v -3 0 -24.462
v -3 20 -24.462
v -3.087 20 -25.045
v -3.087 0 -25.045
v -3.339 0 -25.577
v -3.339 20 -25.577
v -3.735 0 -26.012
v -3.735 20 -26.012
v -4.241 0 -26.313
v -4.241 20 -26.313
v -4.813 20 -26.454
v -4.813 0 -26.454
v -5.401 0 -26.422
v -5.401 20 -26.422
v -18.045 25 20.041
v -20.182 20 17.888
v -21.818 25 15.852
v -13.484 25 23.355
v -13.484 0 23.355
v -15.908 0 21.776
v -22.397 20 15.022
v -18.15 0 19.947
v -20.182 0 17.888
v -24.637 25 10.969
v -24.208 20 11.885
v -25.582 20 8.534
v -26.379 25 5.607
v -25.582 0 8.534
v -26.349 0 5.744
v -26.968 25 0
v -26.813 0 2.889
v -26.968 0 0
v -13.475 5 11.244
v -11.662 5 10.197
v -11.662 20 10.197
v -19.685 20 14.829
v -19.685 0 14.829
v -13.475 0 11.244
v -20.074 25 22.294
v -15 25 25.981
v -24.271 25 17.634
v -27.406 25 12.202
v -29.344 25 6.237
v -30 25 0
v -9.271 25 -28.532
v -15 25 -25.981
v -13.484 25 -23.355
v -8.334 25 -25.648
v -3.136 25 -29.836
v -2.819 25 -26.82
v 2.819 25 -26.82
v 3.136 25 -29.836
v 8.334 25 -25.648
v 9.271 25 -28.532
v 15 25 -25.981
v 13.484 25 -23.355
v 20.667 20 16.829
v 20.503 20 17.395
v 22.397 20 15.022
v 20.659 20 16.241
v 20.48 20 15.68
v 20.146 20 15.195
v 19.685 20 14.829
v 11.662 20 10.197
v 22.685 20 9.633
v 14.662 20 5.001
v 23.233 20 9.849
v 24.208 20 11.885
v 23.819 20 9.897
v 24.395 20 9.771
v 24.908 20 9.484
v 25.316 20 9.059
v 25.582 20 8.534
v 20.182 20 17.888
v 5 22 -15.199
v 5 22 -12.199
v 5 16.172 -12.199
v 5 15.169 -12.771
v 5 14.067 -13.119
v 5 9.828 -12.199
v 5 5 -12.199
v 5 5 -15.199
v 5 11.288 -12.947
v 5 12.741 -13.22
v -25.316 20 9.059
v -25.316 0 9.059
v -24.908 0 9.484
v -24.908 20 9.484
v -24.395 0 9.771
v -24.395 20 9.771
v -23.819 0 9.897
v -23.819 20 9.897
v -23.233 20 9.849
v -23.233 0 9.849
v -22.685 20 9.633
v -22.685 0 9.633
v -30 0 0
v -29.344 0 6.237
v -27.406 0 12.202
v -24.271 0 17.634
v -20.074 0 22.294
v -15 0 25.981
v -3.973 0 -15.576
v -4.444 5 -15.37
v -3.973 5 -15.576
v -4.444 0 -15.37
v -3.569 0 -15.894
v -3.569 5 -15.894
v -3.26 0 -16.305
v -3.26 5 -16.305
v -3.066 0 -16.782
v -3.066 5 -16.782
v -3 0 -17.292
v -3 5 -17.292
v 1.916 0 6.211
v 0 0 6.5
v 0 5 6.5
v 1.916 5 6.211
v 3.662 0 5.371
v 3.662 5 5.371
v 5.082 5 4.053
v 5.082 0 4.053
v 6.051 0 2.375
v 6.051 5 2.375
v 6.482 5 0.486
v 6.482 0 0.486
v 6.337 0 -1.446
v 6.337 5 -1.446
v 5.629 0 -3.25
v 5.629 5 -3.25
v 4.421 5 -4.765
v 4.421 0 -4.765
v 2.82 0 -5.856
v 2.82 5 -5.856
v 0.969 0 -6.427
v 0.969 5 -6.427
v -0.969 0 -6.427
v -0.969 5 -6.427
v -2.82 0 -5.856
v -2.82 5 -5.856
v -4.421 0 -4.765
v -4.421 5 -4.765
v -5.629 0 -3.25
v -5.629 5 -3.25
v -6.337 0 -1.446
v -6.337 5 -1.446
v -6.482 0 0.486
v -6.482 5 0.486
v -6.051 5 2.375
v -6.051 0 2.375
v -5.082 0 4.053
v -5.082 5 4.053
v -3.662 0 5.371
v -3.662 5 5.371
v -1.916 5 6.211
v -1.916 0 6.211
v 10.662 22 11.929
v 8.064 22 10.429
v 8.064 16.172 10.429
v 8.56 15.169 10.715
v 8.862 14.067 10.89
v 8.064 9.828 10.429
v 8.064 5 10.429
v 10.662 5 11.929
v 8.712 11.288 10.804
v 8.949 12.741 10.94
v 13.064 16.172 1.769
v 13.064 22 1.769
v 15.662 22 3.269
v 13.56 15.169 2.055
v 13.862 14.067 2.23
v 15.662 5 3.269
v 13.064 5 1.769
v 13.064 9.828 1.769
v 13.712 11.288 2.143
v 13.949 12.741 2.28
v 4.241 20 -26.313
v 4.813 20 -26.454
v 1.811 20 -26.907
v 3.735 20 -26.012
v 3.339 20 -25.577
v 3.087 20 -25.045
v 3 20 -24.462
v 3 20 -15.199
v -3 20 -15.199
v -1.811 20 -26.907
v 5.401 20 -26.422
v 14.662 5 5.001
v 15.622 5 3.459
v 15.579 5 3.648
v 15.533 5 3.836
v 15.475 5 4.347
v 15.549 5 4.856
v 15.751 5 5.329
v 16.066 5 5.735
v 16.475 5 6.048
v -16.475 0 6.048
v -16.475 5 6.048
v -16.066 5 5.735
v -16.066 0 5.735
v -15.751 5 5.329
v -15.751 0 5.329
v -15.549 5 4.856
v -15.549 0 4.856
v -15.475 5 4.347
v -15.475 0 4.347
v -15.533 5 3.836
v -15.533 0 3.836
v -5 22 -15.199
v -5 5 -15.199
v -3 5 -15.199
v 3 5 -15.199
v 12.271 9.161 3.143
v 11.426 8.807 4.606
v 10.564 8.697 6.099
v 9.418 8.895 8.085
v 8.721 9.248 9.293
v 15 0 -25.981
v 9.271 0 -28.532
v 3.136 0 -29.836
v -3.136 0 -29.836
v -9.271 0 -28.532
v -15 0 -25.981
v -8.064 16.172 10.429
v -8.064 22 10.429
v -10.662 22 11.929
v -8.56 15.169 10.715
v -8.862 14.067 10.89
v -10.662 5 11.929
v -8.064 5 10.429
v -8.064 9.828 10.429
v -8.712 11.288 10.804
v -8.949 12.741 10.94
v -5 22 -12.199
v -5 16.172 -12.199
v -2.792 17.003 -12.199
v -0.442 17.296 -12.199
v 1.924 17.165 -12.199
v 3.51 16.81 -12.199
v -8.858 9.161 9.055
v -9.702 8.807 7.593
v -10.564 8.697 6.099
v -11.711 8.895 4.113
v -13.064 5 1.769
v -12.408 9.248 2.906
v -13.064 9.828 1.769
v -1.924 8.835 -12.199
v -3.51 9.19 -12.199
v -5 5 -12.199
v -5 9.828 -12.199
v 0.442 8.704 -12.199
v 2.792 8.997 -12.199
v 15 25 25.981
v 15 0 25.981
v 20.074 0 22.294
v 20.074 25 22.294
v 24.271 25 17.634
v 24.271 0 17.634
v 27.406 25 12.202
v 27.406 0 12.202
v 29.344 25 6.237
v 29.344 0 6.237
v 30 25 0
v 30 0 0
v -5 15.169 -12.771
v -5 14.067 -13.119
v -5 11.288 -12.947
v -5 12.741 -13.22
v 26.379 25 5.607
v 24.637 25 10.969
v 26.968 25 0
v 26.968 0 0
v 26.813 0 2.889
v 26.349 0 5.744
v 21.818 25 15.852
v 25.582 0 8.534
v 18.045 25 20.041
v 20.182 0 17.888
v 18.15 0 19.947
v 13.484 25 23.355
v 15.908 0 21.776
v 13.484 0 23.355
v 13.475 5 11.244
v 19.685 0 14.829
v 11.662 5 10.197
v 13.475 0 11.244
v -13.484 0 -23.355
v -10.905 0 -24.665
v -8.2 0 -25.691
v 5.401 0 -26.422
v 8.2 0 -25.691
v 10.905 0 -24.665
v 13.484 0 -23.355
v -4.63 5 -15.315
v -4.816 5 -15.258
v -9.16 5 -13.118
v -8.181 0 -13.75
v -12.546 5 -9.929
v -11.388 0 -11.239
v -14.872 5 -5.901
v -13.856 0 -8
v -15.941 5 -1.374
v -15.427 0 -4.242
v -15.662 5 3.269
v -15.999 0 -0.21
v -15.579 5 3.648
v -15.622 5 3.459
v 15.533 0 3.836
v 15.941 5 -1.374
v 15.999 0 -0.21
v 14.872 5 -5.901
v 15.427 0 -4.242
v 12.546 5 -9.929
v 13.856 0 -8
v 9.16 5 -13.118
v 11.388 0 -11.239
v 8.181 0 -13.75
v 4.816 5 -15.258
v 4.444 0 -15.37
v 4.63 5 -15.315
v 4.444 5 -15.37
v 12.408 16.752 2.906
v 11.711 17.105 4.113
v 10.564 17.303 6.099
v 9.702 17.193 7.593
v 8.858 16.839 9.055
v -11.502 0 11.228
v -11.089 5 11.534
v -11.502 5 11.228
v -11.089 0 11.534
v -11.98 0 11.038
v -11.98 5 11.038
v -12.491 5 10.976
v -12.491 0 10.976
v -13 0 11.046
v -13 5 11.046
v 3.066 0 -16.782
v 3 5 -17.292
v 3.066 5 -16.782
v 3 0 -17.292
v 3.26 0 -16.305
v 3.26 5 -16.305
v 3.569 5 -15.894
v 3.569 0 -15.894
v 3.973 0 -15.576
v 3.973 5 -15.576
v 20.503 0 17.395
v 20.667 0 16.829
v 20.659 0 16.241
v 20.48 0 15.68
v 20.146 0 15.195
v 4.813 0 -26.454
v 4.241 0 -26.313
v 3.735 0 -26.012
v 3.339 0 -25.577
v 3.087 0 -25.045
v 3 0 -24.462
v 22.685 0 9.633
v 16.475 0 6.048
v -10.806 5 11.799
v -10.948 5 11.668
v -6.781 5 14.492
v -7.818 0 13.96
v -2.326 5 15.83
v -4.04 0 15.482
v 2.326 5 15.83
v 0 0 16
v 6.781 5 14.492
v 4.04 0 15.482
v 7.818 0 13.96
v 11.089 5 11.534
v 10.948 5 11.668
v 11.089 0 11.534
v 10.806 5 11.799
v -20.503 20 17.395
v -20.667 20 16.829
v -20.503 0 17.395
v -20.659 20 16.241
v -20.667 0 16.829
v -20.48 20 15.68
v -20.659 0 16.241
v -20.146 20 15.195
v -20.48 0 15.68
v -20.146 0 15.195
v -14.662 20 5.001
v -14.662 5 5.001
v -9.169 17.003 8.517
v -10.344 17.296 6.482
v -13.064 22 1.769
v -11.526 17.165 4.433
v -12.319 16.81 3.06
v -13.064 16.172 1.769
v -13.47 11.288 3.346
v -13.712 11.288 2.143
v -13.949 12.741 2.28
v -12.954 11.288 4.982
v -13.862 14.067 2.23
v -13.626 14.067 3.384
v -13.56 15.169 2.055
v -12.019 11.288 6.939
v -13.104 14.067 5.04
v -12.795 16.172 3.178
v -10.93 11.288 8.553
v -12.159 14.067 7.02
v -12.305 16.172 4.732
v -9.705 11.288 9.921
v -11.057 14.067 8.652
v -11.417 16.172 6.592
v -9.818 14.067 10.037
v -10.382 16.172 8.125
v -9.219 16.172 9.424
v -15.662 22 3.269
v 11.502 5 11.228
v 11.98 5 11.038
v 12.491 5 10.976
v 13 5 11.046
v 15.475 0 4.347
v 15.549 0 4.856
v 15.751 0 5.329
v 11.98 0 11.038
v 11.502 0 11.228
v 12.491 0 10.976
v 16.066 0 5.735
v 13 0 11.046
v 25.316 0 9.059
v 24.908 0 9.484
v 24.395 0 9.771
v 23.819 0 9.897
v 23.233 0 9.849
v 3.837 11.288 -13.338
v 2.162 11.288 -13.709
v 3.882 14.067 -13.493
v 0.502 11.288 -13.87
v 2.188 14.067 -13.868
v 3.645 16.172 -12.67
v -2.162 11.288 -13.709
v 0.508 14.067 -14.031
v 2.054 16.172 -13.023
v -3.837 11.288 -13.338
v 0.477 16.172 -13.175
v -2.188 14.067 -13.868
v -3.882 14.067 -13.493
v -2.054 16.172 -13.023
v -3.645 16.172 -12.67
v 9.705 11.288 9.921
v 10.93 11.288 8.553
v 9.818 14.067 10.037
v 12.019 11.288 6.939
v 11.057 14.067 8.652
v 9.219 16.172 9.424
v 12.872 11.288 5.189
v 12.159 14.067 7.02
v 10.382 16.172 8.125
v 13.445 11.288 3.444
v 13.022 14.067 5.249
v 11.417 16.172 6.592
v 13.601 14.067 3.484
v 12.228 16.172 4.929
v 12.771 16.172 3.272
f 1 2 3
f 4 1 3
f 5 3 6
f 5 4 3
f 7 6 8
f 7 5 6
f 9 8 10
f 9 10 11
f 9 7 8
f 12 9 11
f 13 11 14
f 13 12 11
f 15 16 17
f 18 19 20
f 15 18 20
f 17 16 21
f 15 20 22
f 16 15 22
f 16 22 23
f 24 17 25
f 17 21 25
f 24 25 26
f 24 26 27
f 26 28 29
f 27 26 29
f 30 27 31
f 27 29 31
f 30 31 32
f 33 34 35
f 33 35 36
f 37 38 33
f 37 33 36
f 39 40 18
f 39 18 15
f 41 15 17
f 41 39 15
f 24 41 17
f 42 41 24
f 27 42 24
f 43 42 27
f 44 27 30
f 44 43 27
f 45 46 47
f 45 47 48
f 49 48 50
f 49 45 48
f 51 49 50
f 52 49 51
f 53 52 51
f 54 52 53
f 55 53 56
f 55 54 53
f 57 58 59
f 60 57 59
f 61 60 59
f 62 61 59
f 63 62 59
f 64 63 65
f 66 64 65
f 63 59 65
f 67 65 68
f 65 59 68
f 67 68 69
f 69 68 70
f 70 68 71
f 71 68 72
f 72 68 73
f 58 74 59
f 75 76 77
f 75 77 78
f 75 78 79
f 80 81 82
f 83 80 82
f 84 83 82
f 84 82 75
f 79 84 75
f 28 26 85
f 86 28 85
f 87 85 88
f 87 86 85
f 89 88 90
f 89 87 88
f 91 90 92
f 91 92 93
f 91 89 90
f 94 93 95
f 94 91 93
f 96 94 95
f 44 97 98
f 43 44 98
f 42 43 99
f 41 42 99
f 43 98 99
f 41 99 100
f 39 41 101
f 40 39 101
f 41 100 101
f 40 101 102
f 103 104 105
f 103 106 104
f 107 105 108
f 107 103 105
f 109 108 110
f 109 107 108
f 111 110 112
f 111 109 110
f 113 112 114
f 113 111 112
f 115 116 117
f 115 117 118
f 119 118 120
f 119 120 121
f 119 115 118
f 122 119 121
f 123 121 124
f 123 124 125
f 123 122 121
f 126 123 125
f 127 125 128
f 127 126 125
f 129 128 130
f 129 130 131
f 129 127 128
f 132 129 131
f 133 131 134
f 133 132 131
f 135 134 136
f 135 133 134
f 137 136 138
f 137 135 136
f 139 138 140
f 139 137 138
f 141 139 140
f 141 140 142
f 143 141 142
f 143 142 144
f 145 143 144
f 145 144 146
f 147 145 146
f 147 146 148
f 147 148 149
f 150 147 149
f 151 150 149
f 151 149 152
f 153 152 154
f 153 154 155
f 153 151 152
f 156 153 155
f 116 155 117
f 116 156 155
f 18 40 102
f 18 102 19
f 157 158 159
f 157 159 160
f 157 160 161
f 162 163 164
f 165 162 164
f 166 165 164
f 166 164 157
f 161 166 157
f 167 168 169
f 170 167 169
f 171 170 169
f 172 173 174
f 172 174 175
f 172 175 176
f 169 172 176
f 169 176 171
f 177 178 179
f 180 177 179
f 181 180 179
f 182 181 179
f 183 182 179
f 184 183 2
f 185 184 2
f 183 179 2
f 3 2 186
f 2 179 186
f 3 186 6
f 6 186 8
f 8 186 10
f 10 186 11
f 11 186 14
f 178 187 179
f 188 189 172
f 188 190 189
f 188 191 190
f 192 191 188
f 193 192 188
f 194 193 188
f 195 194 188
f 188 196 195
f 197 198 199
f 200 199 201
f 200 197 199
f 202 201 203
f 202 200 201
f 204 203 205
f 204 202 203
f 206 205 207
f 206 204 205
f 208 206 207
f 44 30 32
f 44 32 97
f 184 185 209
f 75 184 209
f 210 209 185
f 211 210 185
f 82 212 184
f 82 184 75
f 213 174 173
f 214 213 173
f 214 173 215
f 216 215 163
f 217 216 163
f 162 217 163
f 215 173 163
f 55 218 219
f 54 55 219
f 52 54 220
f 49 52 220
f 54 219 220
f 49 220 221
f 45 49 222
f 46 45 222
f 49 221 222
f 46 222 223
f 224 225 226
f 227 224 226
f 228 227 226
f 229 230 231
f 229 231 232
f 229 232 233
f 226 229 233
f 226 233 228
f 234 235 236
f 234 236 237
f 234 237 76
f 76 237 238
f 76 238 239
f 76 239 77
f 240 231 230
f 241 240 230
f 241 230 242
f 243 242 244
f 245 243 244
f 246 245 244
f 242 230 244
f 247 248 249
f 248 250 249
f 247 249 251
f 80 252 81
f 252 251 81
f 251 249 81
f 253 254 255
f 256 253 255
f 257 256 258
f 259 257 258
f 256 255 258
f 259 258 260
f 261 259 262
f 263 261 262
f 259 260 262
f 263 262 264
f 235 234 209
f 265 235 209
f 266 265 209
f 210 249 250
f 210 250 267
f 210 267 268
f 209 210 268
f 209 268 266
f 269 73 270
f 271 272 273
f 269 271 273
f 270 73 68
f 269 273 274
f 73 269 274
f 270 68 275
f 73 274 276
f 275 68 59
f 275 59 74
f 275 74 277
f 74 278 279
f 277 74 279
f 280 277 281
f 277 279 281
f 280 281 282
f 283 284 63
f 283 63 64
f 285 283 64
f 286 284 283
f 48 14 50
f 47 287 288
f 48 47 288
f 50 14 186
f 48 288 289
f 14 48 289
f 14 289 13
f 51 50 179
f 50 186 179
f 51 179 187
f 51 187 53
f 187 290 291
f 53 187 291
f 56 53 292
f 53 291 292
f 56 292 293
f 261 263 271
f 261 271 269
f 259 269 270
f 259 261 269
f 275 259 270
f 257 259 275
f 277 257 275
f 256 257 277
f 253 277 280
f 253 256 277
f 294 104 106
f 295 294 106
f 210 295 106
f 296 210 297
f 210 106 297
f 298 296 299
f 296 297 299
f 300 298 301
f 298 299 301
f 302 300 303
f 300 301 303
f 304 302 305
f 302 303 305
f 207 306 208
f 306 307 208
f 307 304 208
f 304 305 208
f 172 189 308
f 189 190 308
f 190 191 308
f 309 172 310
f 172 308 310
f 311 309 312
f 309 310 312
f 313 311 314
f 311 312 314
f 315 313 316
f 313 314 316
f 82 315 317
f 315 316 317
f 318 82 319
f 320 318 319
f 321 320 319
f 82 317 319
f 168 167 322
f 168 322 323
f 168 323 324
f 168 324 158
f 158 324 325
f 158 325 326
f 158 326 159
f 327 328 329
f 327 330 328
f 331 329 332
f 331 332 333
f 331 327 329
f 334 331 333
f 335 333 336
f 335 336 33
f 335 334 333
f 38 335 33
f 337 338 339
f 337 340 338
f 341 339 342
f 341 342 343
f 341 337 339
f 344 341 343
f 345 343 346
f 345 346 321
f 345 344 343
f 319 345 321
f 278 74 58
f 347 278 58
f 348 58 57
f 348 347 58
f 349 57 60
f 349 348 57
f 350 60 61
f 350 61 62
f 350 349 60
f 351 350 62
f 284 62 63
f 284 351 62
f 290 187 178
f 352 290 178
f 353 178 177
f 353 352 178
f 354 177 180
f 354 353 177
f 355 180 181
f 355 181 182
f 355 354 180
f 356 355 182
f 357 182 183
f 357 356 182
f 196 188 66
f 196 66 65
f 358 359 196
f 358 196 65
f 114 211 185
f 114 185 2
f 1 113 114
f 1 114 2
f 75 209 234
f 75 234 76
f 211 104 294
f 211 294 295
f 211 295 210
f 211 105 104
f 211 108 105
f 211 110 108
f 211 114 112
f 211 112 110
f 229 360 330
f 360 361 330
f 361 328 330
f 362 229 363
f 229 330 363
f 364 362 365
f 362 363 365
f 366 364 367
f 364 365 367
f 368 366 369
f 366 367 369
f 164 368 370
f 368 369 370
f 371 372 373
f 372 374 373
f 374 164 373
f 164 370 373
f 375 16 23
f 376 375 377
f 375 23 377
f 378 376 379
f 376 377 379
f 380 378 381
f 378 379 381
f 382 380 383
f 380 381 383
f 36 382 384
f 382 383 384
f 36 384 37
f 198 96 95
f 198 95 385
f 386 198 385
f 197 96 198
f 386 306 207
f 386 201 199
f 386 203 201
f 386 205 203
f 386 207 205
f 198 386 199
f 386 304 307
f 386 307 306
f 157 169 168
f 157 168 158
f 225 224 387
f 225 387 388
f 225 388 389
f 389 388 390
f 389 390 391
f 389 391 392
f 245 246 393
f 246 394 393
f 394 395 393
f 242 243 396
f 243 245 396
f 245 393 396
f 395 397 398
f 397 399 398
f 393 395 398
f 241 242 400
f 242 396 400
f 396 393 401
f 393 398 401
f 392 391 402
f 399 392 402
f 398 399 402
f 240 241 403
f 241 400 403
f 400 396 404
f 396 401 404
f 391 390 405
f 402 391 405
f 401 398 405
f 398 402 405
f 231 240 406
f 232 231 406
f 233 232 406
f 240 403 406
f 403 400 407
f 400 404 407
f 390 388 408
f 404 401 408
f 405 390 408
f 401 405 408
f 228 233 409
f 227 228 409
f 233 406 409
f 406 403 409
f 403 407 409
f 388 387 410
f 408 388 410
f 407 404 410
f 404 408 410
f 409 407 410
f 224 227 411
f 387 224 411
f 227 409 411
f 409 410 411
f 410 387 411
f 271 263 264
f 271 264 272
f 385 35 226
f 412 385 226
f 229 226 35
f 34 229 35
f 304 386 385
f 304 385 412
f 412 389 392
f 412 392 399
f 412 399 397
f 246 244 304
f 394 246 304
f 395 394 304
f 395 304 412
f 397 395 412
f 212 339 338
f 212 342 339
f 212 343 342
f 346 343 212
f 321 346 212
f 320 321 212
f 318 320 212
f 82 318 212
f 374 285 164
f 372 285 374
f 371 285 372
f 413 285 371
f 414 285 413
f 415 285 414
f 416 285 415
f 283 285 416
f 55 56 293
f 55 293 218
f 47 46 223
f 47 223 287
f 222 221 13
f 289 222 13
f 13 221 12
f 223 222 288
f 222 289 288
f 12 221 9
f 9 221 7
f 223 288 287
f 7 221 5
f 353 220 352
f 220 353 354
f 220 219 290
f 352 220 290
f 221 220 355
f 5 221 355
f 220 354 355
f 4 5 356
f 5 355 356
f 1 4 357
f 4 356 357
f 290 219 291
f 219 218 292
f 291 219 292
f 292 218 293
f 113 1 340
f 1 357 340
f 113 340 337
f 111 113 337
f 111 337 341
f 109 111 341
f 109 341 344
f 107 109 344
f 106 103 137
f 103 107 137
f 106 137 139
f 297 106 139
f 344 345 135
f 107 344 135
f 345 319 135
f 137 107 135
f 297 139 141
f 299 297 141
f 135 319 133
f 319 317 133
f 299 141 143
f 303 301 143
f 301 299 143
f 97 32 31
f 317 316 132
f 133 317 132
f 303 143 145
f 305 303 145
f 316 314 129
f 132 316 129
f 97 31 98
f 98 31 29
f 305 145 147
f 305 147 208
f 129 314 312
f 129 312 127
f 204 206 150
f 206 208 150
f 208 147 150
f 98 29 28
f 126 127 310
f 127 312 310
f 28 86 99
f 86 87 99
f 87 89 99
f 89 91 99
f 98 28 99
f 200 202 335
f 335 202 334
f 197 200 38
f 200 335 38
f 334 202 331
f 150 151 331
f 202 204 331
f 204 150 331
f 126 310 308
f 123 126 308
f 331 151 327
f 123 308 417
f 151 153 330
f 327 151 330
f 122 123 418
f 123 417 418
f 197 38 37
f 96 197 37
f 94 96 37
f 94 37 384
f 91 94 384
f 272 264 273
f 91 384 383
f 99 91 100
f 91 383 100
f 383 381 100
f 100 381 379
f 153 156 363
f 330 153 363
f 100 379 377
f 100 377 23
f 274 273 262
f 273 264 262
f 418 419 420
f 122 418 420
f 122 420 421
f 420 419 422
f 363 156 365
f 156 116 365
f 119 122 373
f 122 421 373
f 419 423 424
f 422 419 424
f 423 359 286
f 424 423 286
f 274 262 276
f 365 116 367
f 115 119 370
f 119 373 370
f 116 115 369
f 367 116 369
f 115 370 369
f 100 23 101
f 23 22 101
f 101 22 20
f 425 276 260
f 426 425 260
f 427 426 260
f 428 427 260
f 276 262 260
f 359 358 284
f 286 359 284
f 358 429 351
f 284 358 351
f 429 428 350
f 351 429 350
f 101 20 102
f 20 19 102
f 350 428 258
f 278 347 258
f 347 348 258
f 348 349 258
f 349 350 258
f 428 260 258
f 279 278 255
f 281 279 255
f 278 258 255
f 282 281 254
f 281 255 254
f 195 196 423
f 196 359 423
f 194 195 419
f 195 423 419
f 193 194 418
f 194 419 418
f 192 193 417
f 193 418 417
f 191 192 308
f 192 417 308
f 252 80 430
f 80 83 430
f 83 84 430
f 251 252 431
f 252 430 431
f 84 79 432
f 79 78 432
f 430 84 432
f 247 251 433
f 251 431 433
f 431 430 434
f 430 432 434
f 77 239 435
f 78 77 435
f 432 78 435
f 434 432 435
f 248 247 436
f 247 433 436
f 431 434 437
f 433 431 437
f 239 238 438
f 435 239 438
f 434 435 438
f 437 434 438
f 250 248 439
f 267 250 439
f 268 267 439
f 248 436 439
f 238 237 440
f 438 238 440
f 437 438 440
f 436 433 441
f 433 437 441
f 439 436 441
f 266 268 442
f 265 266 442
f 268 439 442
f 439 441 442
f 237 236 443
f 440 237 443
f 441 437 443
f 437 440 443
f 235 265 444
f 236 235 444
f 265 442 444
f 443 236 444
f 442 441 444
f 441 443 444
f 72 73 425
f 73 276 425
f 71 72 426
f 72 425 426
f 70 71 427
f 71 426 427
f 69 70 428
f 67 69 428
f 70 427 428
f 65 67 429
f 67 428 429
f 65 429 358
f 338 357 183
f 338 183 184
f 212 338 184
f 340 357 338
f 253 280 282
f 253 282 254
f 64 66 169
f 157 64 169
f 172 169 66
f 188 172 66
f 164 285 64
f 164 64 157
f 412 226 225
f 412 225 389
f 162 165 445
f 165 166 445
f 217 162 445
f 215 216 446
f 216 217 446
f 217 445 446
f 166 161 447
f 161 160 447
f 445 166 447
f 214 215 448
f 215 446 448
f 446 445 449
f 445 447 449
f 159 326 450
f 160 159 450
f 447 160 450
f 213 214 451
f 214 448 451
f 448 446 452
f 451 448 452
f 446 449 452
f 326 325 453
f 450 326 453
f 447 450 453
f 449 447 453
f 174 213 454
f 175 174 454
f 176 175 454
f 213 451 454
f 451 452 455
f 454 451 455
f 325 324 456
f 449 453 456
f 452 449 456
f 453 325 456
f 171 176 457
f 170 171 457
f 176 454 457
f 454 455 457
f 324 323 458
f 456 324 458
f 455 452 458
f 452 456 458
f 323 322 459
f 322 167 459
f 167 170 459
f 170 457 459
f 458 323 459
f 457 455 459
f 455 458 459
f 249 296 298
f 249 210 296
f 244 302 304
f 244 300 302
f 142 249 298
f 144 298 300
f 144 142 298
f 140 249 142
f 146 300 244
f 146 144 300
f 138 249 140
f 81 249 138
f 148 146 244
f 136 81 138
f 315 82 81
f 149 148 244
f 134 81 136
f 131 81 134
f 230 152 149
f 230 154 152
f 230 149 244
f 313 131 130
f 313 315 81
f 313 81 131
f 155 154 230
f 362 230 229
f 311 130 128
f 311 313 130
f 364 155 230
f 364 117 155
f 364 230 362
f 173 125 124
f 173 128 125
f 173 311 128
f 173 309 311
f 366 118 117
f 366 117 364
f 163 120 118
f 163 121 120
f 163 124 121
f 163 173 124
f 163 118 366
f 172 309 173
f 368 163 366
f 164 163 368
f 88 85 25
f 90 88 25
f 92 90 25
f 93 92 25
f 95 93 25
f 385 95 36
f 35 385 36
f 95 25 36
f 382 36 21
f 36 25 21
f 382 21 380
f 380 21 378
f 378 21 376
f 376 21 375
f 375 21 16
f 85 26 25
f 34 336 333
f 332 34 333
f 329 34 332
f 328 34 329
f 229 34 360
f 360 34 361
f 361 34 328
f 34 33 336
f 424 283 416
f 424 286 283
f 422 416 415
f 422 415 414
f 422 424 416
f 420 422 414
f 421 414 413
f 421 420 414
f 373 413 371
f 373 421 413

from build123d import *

# Parameters (mm, degrees)
SKETCH_1_R               = 16
SKETCH_1_R_2             = 6.5
EXTRUDE_1_DEPTH          = 5
SKETCH_2_W               = 10
SKETCH_2_H               = 3
EXTRUDE_2_DEPTH          = 22
EXTRUDE_3_DEPTH          = 25
EXTRUDE_4_DEPTH          = 20
FILLET_1_R               = 2
FILLET_2_R               = 2
FILLET_3_R               = 2
FILLET_4_R               = 2
PATTERN_CIRCULAR_4_COUNT = 3
PATTERN_CIRCULAR_5_COUNT = 3
FILLET_5_R               = 2


with BuildPart() as part:
    # 草图1 → 凸台-拉伸1 (new body)
    with BuildSketch(Plane(origin=(0, 0, 0), x_dir=(1, 0, 0), z_dir=(0, 1, 0))):
        with Locations(Location((0, 0, 0), (0, 0, 270))):
            Circle(SKETCH_1_R)
        with Locations(Location((0, 0, 0), (0, 0, 270))):
            Circle(SKETCH_1_R_2, mode=Mode.SUBTRACT)
    extrude(amount=EXTRUDE_1_DEPTH)

    # 草图2 → 凸台-拉伸2 (add)
    with BuildSketch(Plane(origin=(0, 0, 0), x_dir=(1, 0, 0), z_dir=(0, 1, 0))):
        with Locations((-1.78e-15, 13.698684153570664)):
            Rectangle(SKETCH_2_W, SKETCH_2_H)
    extrude_2 = extrude(amount=EXTRUDE_2_DEPTH)



with BuildPart() as body_2:
    # 草图3 → 凸台-拉伸3 (new body)
    with BuildSketch(Plane(origin=(0, 0, 0), x_dir=(1, 0, 0), z_dir=(0, 1, 0))):
        with BuildLine():
            Line((-15.000000000000039, 25.98076211353314), (-13.484105265359647, 23.355155414209925))
            ThreePointArc((-13.484105265359647, 23.355155414209925), (1.65e-15, 26.968210530719293), (13.484105265359647, 23.355155414209925))
            Line((13.484105265359647, 23.355155414209925), (15.000000000000039, 25.98076211353314))
            ThreePointArc((15.000000000000039, 25.98076211353314), (1.84e-15, 30), (-15.000000000000039, 25.98076211353314))
        make_face()
    extrude_3 = extrude(amount=EXTRUDE_3_DEPTH)


with BuildPart() as part_1:
    add(part.part)

    add(body_2.part)  # 凸台-拉伸4 merges body 2
    # 草图4 → 凸台-拉伸4 (add)
    with BuildSketch(Plane(origin=(0, 0, 0), x_dir=(1, 0, 0), z_dir=(0, 1, 0))):
        Polygon((2.9999999999999964, 14.402885682574833), (-3.000000000000003, 14.402885682574832), (-3.0000000000000036, 27.990866329379006), (2.9999999999999964, 27.990866329379006), align=None)
    extrude_4 = extrude(amount=EXTRUDE_4_DEPTH)

    # 草图5 → 切除-旋转1 (revolve, cut)
    with BuildSketch(Plane(origin=(0, 0, 0), x_dir=(0, 0, -1), z_dir=(1, 0, 0))):
        with BuildLine():
            Line((12.198684153570664, 17.303207954702064), (8.4, 13))
            Line((8.4, 13), (12.198684153570664, 8.696792045297935))
            ThreePointArc((12.198684153570664, 8.696792045297935), (14.139999999999999, 13), (12.198684153570664, 17.303207954702064))
        make_face()
    cut_revolve_1 = revolve(axis=Axis((0, -2.5210076515236324, 0), (0, 1, 0)), mode=Mode.SUBTRACT)

    # 圆角1
    fillet_1_edges = [part_1.edges().sort_by_distance(p)[0] for p in [
        (2.9999999999999964, 10, -26.80082795790456),
    ]]
    fillet(fillet_1_edges, radius=FILLET_1_R)

    # 圆角2
    fillet_2_edges = [part_1.edges().sort_by_distance(p)[0] for p in [
        (-3.0000000000000036, 10, -26.80082795790456),
    ]]
    fillet(fillet_2_edges, radius=FILLET_2_R)

    # 圆角3
    fillet_3_edges = [part_1.edges().sort_by_distance(p)[0] for p in [
        (-3.000000000000003, 2.5, -15.71623364550171),
    ]]
    fillet(fillet_3_edges, radius=FILLET_3_R)

    # 圆角4
    fillet_4_edges = [part_1.edges().sort_by_distance(p)[0] for p in [
        (2.9999999999999964, 2.5, -15.716233645501712),
    ]]
    fillet(fillet_4_edges, radius=FILLET_4_R)

    # 阵列(圆周)4: 凸台-拉伸2, 凸台-拉伸4, 切除-旋转1 ×3 about axis
    pattern_circular_4_axis = Axis((1.5e-16, 0, 7.6e-16), (0, 1, 0))
    add([extrude_2.rotate(pattern_circular_4_axis, i * 360 / PATTERN_CIRCULAR_4_COUNT) for i in range(1, PATTERN_CIRCULAR_4_COUNT)])
    add([extrude_4.rotate(pattern_circular_4_axis, i * 360 / PATTERN_CIRCULAR_4_COUNT) for i in range(1, PATTERN_CIRCULAR_4_COUNT)])
    add([cut_revolve_1.rotate(pattern_circular_4_axis, i * 360 / PATTERN_CIRCULAR_4_COUNT) for i in range(1, PATTERN_CIRCULAR_4_COUNT)], mode=Mode.SUBTRACT)

    # 阵列(圆周)5: 凸台-拉伸3 ×3 about axis
    pattern_circular_5_axis = Axis((3.1e-16, 0, 6.1e-16), (0, 1, 0))
    for i in range(1, PATTERN_CIRCULAR_5_COUNT):
        add(extrude_3.rotate(pattern_circular_5_axis, i * 360 / PATTERN_CIRCULAR_5_COUNT))

    # 圆角5
    fillet_5_edges = [part_1.edges().sort_by_distance(p)[0] for p in [
        (12.110657588816196, 2.5, 10.456193034104174),
        (15.110657588816197, 2.5, 5.260040611397544),
        (-15.110657588816201, 2.5, 5.260040611397544),
        (-12.110657588816197, 2.5, 10.456193034104171),
        (24.710197854001564, 10, 10.802337767598974),
        (21.71019785400156, 10, 15.998490190305604),
        (-21.71019785400157, 10, 15.998490190305594),
        (-24.71019785400157, 10, 10.802337767598964),
    ]]
    fillet(fillet_5_edges, radius=FILLET_5_R)


solid = part_1.part
